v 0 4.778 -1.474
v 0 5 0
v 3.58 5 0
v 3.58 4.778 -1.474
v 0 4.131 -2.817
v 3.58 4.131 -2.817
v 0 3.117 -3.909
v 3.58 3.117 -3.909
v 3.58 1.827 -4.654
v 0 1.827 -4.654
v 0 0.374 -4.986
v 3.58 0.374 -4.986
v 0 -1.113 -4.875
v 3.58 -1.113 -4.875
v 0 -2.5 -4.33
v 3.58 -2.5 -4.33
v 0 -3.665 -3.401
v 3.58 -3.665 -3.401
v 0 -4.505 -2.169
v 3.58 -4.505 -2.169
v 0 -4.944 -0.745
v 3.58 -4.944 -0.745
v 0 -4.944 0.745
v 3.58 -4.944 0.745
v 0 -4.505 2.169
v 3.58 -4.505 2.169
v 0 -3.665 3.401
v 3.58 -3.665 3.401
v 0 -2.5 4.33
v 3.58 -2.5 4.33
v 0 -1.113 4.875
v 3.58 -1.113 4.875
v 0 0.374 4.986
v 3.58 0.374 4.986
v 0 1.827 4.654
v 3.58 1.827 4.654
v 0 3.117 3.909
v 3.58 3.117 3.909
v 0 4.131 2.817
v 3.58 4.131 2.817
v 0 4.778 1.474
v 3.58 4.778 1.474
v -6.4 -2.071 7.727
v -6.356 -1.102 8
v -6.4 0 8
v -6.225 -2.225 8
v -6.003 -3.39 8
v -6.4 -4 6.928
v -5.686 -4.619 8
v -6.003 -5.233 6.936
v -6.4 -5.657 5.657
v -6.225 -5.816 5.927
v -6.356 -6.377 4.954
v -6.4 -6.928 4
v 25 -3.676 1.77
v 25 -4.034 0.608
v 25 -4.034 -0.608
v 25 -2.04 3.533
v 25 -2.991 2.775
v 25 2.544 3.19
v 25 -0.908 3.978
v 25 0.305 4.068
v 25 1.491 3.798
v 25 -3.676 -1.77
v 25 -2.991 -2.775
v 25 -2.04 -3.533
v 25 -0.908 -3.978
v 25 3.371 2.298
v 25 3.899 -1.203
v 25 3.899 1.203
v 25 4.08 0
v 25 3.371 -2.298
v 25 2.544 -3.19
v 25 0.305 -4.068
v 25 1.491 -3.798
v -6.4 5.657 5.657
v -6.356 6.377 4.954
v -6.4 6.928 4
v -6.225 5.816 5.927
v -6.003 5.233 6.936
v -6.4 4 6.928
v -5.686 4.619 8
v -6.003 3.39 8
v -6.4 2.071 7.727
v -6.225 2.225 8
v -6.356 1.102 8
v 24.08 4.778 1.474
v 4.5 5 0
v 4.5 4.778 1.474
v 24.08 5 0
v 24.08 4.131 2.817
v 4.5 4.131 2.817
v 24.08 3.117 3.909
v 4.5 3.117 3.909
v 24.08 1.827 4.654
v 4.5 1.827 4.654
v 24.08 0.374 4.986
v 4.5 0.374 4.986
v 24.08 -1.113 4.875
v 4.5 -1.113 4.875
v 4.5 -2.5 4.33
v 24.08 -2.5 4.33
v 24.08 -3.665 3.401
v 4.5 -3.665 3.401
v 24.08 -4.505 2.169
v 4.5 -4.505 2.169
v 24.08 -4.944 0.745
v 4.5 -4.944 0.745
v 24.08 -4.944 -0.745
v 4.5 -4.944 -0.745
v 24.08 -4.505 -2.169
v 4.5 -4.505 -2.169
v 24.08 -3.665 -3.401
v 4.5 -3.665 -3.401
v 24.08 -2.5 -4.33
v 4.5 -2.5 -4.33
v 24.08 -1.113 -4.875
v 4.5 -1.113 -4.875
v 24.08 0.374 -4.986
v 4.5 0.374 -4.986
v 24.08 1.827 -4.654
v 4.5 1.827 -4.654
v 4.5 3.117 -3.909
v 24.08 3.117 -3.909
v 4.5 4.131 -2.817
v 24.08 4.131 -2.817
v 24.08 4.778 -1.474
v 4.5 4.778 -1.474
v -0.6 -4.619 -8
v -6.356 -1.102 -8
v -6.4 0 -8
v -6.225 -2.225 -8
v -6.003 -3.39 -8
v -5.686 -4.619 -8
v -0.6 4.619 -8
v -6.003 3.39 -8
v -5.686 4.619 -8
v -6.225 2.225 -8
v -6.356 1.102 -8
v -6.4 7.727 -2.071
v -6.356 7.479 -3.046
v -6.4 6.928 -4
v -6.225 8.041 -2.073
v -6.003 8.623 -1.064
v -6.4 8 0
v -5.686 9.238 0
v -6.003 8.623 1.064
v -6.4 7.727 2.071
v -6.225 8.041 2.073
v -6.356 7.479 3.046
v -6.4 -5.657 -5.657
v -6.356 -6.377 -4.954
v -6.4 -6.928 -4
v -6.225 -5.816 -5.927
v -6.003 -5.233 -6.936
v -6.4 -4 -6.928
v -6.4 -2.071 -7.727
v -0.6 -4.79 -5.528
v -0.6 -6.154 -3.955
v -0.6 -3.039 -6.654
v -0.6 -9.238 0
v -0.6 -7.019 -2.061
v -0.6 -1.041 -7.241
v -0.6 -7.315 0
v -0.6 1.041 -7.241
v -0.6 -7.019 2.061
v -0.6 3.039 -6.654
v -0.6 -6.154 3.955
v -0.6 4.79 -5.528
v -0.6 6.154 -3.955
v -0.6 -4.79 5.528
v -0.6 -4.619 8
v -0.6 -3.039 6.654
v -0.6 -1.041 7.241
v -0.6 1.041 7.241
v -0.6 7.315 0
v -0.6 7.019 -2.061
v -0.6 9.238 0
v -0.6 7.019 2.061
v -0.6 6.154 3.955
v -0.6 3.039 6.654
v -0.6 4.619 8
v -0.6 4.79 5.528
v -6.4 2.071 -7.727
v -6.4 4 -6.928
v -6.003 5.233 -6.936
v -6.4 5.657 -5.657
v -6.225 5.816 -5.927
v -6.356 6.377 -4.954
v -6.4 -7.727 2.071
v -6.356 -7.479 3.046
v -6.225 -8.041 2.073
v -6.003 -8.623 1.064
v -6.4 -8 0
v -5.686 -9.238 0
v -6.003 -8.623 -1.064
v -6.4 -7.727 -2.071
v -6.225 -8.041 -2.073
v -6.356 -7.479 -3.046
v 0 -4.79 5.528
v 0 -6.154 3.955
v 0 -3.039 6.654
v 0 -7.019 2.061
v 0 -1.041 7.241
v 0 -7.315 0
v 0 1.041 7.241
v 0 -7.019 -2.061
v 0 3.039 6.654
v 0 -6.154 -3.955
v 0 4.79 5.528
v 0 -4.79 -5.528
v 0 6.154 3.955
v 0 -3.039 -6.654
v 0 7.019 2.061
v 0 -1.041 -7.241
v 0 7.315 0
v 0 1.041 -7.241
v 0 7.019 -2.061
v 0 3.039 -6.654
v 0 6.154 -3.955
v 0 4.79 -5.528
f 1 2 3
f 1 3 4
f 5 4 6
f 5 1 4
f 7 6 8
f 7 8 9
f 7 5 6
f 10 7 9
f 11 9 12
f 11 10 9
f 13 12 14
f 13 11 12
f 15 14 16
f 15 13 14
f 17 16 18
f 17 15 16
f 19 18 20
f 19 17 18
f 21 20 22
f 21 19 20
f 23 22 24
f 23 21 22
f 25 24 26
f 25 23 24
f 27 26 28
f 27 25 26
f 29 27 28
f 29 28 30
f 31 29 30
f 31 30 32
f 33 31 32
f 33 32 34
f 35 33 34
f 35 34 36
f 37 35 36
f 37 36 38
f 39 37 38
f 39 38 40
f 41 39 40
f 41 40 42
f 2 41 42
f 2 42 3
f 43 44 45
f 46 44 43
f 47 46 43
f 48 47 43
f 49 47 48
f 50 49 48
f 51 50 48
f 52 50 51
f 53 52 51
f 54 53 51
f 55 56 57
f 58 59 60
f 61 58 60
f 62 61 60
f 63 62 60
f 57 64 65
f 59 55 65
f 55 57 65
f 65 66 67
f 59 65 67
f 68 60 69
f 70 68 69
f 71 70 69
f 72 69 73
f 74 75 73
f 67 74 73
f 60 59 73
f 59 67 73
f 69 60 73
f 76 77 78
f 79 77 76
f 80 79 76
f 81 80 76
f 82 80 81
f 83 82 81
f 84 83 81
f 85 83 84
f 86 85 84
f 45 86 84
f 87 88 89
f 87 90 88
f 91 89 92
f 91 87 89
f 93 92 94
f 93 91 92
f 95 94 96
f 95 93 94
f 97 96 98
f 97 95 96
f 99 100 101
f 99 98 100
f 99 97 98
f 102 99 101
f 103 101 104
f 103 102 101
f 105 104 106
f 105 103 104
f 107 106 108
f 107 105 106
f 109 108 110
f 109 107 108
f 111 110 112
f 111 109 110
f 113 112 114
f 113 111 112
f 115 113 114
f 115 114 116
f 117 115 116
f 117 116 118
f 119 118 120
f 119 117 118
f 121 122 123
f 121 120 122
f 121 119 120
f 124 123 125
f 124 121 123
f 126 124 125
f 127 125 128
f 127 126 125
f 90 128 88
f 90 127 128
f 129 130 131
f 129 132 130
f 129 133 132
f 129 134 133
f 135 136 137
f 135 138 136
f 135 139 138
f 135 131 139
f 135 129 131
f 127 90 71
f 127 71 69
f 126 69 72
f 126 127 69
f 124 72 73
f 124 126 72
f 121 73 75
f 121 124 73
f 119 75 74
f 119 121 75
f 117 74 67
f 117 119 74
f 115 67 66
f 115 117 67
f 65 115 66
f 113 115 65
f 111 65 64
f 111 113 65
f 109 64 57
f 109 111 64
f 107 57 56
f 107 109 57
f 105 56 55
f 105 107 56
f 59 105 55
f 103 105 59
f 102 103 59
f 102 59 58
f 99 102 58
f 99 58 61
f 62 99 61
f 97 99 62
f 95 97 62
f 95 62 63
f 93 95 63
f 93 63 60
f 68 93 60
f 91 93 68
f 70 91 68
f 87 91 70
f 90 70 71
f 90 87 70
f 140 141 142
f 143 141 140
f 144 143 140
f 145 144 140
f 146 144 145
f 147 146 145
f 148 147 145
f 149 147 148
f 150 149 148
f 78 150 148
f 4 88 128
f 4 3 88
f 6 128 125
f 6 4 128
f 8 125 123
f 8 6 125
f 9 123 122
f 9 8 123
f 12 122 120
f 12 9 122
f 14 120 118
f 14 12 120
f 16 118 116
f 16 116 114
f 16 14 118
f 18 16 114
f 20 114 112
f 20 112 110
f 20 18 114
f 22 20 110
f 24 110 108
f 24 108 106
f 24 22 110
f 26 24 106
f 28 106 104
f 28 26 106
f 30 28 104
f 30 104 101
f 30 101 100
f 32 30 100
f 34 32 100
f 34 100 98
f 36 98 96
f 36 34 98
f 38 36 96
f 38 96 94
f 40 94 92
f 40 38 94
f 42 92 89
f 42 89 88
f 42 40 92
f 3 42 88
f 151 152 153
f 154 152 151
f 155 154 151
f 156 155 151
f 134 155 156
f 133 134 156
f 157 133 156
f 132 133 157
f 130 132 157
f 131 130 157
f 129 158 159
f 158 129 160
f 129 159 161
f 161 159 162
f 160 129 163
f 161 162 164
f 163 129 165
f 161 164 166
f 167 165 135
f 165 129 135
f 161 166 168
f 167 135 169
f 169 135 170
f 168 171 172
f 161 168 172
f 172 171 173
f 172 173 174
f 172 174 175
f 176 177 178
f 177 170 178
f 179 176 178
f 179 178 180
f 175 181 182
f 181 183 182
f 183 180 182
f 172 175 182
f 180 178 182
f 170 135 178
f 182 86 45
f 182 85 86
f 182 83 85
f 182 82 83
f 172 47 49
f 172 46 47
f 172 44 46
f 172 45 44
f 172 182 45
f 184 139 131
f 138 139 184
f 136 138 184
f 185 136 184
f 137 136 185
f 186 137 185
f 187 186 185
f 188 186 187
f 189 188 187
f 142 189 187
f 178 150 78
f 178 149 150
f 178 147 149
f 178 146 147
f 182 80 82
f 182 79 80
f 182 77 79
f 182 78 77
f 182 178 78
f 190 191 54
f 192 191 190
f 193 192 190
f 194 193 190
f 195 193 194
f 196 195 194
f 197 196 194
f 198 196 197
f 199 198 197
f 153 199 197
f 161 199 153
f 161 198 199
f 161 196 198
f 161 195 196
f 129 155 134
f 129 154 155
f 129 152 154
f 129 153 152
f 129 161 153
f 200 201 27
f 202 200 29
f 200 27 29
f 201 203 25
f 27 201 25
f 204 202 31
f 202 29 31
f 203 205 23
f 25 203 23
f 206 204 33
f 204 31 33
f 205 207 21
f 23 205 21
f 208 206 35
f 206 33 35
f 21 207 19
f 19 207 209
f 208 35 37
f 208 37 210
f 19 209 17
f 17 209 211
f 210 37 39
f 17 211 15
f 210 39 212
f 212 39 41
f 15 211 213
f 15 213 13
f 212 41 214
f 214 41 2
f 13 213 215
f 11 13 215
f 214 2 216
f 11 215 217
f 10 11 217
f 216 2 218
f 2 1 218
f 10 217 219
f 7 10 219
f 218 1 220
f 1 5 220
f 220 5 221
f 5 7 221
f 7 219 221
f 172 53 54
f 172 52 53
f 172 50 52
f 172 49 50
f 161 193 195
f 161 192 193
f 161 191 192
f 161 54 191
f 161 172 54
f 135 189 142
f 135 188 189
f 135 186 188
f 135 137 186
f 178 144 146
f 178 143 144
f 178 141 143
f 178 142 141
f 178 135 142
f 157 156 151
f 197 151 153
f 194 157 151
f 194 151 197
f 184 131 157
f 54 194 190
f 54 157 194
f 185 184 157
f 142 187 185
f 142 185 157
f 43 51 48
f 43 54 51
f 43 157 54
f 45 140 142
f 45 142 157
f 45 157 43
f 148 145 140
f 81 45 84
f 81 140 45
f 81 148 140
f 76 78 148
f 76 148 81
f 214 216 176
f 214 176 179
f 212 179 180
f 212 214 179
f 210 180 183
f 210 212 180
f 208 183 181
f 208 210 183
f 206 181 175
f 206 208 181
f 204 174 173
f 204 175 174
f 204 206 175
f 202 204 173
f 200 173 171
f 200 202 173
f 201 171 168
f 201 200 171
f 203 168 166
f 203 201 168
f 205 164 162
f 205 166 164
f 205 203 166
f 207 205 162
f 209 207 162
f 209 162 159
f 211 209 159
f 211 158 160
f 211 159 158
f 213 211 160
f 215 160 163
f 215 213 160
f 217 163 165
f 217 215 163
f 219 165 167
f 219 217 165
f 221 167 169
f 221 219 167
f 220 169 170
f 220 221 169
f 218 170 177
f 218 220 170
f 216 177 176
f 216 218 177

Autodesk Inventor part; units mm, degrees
ref_plane "YZ Plane" through (0, 0, 0) normal (1, 0, 0) x (0, 1, 0)
ref_plane "XZ Plane" through (0, 0, 0) normal (0, 1, 0) x (-1, 0, 0)
sketch "Sketch1" plane through (0, 0, 0) normal (0, 0, 1) x (1, 0, 0)
  line L0 (0, 7.315) -> (0, 5)
  line L1 (4.5, 5) -> (25, 5)
  line L2 (25, 5) -> (25, 0)
  line L3 (25, 0) -> (-0.6001, 0)
  line L4 (-5.7201, 0) -> (30.12, 0) projected
  line L5 (-0.6001, 0) -> (-0.6001, 7.315)
  line L6 (-0.6001, 7.315) -> (0, 7.315)
  line L7 (4.5, 5) -> (3.5797, 5)
  line L8 (3.5797, 5) -> (0, 5)
  line L9 (0, -1.463) -> (0, 8.778) projected
  dimension "d0" = 25
  dimension "d1" = 20.5
  dimension "d2" = 10
  dimension "d9" = 0.6001
  dimension "d10" = 14.63
  dimension "d13" = 0.9203
  dimension "d14" = 10
revolve "Body" add sketch "Sketch1" angle 360 about axis through (25, 0, 0) along (-1, 0, 0)
sketch "Sketch2" plane through (-0.6001, 0, 0) normal (-1, 0, 0) x (0, 0, 1)
  line L0 (0, 9.2376) -> (8, 4.6188)
  line L1 (8, 4.6188) -> (8, -4.6188)
  line L2 (8, -4.6188) -> (0, -9.2376)
  line L3 (0, -9.2376) -> (-8, -4.6188)
  line L4 (-8, -4.6188) -> (-8, 4.6188)
  line L5 (-8, 4.6188) -> (0, 9.2376)
  point P0 (0, 0)
  point P1 (0, 0)
  dimension "d11" = 16
extrude "Head" add sketch "Sketch2" along normal blind 5.8
sketch "Sketch4" plane through (0, 0, 0) normal (0, 0, 1) x (1, 0, 0)
  line L0 (-6.4001, 8) -> (-6.4001, 9.2376)
  line L1 (-6.4001, 9.2376) -> (-5.6856, 9.2376)
  line L2 (-5.6856, 9.2376) -> (-6.4001, 8)
  line L3 (-7.5601, 0) -> (0.5599, 0) projected
  line L4 (-0.6001, 9.2376) -> (-6.4001, 9.2376) projected
  line L5 (-6.4001, 4.6188) -> (-6.4001, 9.2376) projected
  dimension "d5" = 30
  dimension "d19" = 16
revolve "Chamfer1" cut sketch "Sketch4" angle 360 about axis through (-10, 0, 0) along (1, 0, 0)
thread "Thread" size "M10x1.5" class "6g" standard "ISO Metric profile" length 20.5
chamfer "Chamfer2" distance 0.9202 distance2 0.9203 1 edges at (25, -5, 0) measured on face at (25, 1.974, 0.2121)
ref_plane "Work Plane1" through (1.525, 0, 0) normal (0, 0, 1) x (1, 0, 0)
equation "\"d11\" = SW"
equation "\"d3\" = KOH - SD"
equation "\"d15\" = GEL"
equation "\"d6\" = -0.5 * SPD + 0.5 * GD"
equation "\"d0\" = NLG"
equation "\"d1\" = GEL"
equation "\"d2\" = GD"
equation "\"d10\" = SD2"
equation "\"d14\" = BDM"
equation "\"d5\" = ANG1"
equation "\"d19\" = SW0"
equation "\"NLG\" = 25"
equation "\"GD\" = NND"
equation "\"BDM\" = NND"
equation "\"KOH\" = 6.4"
equation "\"GEL\" = 20.5"
equation "\"SW\" = 16"
equation "\"SW0\" = SW"
equation "\"SPD\" = NND - 1.2269 * PTC"
equation "\"SD2\" = 14.63"
equation "\"SD\" = 0.6"
equation "\"ANG1\" = 30deg"
equation "\"GAL\" = 0.61345 * PTC"
equation "\"GUL\" = 0.61345 * PTC"
equation "\"RR\" = 0.4"
equation "\"GD1\" = THREADDIA - 1.2269 * PTC"
equation "\"SDH\" = SD2"
equation "\"SDHG\" = 4.5"
equation "\"TOA\" = 30deg"
equation "\"PTC\" = 1.5"
equation "\"E0\" = 18.48"
equation "\"NND\" = 10"
equation "\"THREADDIA\" = 10"
properties part number "ISO 4017 - M10 x 25" material "Steel, Mild"
